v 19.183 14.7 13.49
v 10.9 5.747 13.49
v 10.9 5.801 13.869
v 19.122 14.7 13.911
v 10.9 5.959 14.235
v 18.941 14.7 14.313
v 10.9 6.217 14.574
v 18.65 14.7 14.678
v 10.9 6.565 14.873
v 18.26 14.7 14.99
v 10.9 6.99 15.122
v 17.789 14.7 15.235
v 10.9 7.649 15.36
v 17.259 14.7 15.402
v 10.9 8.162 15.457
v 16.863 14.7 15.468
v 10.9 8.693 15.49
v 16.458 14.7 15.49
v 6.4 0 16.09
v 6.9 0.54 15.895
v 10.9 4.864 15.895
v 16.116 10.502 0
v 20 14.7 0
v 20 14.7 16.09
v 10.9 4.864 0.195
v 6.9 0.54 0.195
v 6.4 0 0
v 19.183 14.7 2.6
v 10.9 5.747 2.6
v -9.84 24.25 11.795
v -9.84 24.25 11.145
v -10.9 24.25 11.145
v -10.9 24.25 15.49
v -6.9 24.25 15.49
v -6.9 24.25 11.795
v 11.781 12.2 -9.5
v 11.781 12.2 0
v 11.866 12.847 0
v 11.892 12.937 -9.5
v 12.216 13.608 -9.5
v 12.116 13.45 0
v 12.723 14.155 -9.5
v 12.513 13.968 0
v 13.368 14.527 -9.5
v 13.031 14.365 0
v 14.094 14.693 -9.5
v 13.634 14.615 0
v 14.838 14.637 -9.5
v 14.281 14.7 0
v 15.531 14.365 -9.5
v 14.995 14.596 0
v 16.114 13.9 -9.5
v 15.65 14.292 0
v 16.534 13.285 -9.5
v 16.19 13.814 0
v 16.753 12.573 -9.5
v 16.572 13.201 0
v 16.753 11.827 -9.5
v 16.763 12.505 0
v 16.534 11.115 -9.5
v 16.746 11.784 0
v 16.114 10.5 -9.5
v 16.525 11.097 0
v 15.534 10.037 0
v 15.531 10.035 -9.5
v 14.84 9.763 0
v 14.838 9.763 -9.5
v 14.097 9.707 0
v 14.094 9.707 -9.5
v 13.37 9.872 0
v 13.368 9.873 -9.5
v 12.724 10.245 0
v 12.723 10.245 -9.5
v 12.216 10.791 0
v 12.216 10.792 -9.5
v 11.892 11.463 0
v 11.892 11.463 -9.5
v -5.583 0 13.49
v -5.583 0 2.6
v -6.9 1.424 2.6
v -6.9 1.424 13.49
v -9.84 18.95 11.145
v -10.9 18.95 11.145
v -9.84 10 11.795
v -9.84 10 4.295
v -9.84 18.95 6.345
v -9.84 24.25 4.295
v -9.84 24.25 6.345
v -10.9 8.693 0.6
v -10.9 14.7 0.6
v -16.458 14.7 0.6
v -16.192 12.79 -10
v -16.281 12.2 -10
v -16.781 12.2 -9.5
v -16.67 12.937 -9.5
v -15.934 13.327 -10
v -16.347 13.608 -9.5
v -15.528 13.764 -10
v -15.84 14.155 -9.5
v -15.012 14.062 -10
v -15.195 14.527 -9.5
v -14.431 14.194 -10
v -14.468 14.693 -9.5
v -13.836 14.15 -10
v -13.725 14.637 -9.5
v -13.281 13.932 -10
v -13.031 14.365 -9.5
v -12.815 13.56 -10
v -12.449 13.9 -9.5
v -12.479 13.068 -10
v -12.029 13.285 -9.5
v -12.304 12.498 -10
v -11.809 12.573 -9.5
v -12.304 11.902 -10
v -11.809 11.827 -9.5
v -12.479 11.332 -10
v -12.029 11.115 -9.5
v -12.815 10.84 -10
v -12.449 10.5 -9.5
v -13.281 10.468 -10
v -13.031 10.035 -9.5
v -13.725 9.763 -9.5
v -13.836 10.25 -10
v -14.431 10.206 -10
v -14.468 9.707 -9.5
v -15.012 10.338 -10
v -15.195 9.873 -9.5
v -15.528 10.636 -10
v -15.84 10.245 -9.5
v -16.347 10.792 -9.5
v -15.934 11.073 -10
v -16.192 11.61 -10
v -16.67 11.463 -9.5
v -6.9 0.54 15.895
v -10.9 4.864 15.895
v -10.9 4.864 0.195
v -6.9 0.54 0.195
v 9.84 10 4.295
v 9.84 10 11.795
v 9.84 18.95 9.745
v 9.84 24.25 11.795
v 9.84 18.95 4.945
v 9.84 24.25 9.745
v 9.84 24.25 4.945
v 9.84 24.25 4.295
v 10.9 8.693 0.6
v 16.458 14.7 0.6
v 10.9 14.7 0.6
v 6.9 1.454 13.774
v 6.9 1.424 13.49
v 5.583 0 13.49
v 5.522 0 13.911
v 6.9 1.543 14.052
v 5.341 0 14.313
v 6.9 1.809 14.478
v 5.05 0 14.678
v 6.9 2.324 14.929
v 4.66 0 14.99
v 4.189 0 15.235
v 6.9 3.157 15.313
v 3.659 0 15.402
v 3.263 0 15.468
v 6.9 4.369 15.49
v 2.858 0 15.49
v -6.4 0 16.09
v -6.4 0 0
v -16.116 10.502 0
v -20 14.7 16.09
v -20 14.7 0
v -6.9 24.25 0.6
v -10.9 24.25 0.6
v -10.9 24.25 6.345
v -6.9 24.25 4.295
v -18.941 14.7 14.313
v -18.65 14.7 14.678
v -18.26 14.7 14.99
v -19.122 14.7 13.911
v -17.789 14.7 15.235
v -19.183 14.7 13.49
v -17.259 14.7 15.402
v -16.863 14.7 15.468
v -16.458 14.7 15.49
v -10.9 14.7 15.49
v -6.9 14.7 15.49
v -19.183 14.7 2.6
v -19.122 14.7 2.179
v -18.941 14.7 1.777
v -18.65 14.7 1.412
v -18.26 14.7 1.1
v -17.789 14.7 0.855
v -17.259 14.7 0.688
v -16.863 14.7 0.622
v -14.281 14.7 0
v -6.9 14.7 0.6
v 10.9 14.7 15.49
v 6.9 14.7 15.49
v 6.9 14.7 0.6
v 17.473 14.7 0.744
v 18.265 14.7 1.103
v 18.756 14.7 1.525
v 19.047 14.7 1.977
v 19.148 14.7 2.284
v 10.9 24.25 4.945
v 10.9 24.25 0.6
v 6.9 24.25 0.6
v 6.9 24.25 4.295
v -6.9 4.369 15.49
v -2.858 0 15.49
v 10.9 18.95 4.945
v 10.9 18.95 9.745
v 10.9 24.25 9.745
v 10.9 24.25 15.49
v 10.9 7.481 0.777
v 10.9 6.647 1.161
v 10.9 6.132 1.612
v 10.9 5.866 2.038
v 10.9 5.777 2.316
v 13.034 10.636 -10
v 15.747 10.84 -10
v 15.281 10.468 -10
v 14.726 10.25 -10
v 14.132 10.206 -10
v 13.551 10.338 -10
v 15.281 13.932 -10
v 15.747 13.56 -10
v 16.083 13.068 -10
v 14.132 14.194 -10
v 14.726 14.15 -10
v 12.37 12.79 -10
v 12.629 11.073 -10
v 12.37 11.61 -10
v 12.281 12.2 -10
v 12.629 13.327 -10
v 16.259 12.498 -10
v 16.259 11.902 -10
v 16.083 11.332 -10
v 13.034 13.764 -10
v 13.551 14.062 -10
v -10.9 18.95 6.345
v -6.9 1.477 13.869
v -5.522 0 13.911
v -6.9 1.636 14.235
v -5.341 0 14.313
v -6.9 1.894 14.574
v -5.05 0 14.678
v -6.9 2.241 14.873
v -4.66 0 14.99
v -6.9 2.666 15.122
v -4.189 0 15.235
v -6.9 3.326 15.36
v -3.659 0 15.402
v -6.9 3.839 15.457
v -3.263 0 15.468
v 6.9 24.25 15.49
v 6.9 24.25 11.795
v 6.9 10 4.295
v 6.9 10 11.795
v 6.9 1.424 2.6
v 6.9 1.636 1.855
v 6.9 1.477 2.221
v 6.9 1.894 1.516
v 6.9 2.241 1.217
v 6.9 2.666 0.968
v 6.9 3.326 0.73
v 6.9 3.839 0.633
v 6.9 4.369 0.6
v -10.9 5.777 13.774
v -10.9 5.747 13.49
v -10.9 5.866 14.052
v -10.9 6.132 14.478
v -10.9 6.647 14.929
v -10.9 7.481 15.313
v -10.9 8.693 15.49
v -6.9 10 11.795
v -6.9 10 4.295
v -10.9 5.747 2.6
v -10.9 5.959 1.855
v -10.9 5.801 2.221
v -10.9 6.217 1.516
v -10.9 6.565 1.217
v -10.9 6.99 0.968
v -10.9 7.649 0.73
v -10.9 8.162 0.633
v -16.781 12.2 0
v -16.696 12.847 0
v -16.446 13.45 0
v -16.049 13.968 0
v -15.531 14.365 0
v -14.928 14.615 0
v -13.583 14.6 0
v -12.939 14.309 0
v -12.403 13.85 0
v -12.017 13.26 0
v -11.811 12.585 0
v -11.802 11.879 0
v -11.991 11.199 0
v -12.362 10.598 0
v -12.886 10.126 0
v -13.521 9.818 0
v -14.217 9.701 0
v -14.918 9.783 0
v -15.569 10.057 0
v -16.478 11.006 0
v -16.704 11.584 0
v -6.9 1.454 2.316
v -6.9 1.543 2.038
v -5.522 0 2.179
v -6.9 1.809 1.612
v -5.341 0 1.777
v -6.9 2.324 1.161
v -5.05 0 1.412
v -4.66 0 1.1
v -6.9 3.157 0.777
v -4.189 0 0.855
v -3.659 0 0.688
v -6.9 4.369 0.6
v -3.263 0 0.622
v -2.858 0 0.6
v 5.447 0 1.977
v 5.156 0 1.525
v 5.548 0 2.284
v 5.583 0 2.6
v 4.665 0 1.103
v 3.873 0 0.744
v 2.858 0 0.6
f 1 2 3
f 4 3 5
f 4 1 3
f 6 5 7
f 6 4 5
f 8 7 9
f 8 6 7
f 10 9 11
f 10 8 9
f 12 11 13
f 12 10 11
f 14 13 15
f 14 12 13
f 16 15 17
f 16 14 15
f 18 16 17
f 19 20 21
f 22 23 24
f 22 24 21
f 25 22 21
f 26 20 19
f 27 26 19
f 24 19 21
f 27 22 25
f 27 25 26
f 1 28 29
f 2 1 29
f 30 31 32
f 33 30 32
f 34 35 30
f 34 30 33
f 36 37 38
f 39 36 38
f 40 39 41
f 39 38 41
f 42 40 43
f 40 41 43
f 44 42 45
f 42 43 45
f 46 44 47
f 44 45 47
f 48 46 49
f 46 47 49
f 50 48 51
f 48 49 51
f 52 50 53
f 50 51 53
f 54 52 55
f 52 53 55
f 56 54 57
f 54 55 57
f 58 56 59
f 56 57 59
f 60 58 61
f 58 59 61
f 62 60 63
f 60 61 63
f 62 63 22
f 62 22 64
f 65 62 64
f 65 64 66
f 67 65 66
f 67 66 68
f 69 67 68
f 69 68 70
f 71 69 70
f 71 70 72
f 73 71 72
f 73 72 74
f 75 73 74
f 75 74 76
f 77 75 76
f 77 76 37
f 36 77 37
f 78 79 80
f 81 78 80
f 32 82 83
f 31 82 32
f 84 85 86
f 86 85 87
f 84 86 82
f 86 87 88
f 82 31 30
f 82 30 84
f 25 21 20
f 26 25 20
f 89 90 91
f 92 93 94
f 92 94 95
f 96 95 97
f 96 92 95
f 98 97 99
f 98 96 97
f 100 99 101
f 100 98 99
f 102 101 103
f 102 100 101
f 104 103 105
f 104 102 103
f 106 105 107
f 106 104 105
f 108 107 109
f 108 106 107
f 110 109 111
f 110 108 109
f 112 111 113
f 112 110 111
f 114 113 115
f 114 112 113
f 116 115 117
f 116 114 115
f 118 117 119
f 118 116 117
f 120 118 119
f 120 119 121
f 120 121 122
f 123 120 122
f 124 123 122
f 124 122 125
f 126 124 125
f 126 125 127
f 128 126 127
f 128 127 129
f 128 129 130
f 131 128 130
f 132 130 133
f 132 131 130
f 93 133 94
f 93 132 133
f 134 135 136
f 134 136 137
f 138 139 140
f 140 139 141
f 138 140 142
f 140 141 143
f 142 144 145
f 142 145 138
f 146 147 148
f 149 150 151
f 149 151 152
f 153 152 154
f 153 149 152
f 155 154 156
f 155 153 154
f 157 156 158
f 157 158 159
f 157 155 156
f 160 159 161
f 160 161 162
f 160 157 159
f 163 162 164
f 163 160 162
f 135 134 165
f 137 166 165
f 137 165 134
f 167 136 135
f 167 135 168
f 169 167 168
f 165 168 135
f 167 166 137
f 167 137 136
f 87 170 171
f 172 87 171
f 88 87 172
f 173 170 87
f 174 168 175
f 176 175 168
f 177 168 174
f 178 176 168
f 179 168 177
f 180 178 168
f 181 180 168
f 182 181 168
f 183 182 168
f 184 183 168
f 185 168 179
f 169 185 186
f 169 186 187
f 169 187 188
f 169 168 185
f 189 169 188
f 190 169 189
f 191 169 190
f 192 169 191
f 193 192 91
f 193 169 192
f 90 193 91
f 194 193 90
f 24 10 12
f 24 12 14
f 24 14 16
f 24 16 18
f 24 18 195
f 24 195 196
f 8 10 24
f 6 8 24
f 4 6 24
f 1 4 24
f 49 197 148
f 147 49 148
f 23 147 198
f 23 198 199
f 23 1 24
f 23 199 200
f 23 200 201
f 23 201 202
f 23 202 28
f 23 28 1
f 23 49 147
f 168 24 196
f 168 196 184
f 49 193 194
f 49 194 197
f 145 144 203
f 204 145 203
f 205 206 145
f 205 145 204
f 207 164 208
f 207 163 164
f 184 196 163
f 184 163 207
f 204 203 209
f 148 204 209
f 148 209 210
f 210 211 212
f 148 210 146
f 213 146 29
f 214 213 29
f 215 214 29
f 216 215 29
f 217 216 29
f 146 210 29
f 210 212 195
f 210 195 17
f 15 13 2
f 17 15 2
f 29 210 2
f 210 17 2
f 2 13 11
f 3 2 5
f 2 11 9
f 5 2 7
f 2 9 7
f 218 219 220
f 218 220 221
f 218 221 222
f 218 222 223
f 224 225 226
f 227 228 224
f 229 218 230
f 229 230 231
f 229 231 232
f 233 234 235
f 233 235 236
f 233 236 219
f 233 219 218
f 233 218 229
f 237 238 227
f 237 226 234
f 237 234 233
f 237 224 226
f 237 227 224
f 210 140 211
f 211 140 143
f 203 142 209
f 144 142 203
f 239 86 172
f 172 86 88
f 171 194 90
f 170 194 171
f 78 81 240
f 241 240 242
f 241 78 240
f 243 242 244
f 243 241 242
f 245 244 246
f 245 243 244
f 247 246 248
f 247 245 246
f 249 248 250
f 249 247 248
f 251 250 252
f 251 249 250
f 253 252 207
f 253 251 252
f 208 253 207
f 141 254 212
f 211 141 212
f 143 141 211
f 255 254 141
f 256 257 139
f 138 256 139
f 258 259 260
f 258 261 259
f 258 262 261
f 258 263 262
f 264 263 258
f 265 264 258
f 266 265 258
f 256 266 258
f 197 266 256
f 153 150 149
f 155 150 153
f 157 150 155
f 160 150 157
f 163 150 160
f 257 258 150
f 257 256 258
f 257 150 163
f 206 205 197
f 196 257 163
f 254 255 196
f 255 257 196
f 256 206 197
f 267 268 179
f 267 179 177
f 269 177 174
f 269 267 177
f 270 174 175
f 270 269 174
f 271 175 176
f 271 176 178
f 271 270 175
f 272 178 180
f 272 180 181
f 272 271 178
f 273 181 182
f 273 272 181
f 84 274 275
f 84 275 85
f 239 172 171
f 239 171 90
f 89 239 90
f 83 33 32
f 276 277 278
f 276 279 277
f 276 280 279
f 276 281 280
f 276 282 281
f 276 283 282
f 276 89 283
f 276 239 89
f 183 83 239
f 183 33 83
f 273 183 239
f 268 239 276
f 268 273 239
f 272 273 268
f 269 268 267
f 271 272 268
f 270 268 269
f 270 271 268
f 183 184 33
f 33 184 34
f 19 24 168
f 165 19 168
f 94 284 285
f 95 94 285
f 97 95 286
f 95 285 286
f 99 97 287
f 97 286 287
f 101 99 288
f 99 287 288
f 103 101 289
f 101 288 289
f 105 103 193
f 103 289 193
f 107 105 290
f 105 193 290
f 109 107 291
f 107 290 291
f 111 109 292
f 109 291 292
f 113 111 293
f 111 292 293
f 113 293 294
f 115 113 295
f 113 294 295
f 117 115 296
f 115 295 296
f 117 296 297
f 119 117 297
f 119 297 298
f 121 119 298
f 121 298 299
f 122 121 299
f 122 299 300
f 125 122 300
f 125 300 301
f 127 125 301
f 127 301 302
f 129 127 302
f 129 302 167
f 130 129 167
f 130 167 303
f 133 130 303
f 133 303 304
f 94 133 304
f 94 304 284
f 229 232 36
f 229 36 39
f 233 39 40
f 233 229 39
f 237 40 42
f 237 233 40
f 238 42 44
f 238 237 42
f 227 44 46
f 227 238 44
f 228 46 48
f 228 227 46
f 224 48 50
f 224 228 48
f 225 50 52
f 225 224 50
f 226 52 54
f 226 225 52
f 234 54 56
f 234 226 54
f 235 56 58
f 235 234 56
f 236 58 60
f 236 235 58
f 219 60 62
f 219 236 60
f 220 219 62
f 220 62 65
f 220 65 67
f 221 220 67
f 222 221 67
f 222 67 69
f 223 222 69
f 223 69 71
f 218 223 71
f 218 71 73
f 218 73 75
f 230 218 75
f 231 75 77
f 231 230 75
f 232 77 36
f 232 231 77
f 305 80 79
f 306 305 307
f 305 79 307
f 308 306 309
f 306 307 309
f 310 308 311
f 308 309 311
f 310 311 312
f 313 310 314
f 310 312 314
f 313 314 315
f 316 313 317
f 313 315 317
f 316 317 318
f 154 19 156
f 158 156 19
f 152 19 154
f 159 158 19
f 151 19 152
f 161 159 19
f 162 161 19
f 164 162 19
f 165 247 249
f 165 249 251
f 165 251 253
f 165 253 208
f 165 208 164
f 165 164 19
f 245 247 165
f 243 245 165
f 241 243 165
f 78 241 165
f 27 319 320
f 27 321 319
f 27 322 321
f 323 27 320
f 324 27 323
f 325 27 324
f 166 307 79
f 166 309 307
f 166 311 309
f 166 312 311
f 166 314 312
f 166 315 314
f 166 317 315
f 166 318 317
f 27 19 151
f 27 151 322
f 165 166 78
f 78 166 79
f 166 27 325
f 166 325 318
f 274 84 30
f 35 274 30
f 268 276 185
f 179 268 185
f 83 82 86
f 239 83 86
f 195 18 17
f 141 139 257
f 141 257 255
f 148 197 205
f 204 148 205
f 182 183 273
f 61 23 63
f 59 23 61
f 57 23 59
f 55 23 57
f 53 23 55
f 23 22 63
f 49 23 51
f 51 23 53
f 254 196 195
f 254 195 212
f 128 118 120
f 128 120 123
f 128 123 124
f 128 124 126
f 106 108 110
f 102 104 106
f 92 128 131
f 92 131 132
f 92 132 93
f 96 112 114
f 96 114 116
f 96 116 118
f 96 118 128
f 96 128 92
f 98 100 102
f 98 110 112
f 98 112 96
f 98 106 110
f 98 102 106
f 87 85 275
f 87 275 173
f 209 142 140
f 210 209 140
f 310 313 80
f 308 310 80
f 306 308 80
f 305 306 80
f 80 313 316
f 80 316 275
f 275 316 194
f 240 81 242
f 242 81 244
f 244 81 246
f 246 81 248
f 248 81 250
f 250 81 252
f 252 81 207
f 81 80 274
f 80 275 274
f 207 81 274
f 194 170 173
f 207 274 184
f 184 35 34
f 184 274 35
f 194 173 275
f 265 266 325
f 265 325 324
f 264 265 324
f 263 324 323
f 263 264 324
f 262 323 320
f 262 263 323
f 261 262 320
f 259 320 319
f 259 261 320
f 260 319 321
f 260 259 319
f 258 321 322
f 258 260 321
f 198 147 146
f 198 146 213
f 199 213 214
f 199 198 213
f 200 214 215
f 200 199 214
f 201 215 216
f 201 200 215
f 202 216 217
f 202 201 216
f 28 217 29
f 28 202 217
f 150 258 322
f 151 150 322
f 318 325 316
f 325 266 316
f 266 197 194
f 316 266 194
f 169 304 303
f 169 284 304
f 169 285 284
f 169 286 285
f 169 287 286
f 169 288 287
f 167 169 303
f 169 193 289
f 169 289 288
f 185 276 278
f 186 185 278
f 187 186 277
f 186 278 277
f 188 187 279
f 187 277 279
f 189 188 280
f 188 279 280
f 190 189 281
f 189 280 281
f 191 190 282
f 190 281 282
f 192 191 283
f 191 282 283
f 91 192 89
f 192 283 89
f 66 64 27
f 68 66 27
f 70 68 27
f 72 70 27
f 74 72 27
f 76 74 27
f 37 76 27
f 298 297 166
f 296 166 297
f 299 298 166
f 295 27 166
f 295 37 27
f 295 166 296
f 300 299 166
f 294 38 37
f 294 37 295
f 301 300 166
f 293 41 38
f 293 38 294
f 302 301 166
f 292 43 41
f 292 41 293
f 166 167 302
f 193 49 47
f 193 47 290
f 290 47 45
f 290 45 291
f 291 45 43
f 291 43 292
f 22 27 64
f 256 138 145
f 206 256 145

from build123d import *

# Parameters (mm, degrees)
AUFSATZ_LINEAR_AUSTRAGEN1_DEPTH  = 16.09
WANDUNG2_T                       = -0.6
VERRUNDUNG1_R                    = 2
VERRUNDUNG2_R                    = 2
SKIZZE7_R                        = 2.5
AUFSATZ_LINEAR_AUSTRAGEN4_DEPTH  = 10
FASE3_SIZE                       = 0.5
AUFSATZ_LINEAR_AUSTRAGEN8_DEPTH  = 7.85
SKIZZE14_W                       = 3.695
SKIZZE14_H                       = 14.25
AUFSATZ_LINEAR_AUSTRAGEN9_DEPTH  = 2.94
SKIZZE15_W                       = 14.89
SKIZZE15_H                       = 14.52
AUFSATZ_LINEAR_AUSTRAGEN10_DEPTH = 1.06
SCHNITT_LINEAR_AUSTRAGEN1_REACH  = 12.16
SKIZZE16_W                       = 4.8
SKIZZE16_H                       = 5.3
SKIZZE17_W                       = 14.89
SKIZZE17_H                       = 14.52
AUFSATZ_LINEAR_AUSTRAGEN11_DEPTH = 1.06
SCHNITT_LINEAR_AUSTRAGEN2_REACH  = 12.16
SKIZZE18_W                       = 4.8
SKIZZE18_H                       = 5.3


with BuildPart() as part:
    # Skizze4 → Aufsatz-Linear austragen1 (new body)
    with BuildSketch(Plane.XY):
        Polygon((-6.4, 0), (-20, 14.7), (20, 14.7), (6.4, 0), align=None)
    extrude(amount=AUFSATZ_LINEAR_AUSTRAGEN1_DEPTH)

    # Wandung2
    wandung2_openings = [part.faces().sort_by_distance(p)[0] for p in [
        (0, 14.7, 8.045),
        (0, 0, 8.045),
    ]]
    offset(amount=WANDUNG2_T, openings=wandung2_openings, kind=Kind.INTERSECTION)

    # Verrundung1
    verrundung1_edges = [part.edges().sort_by_distance(p)[0] for p in [
        (12.382602743, 7.35, 15.49),
        (-12.382602743, 7.35, 15.49),
    ]]
    fillet(verrundung1_edges, radius=VERRUNDUNG1_R)

    # Verrundung2
    verrundung2_edges = [part.edges().sort_by_distance(p)[0] for p in [
        (12.382602743, 7.35, 0.6),
        (-12.382602743, 7.35, 0.6),
    ]]
    fillet(verrundung2_edges, radius=VERRUNDUNG2_R)

    # Skizze7 → Aufsatz-Linear austragen4 (add)
    with BuildSketch(Plane(origin=(0, 0, 0), x_dir=(-1, 0, 0), z_dir=(0, 0, -1))):
        with Locations((-14.281252926, 12.2)):
            Circle(SKIZZE7_R)
        with Locations((14.281252926, 12.2)):
            Circle(SKIZZE7_R)
    extrude(amount=AUFSATZ_LINEAR_AUSTRAGEN4_DEPTH)

    # Fase3
    fase3_edges = [part.edges().sort_by_distance(p)[0] for p in [
        (16.781252926, 12.2, -10),
        (-11.781252926, 12.2, -10),
    ]]
    chamfer(fase3_edges, length=FASE3_SIZE)

    # Skizze12 → Aufsatz-Linear austragen8 (add, symmetric)
    with BuildSketch(Plane.XY.offset(8.045)):
        Polygon((6.9, 0.540441176), (6.9, 10), (10.9, 10), (10.9, 4.863970588), align=None)
    aufsatz_linear_austragen8 = extrude(amount=AUFSATZ_LINEAR_AUSTRAGEN8_DEPTH, both=True)

    # Spiegeln6: Aufsatz-Linear austragen8 across plane
    add(aufsatz_linear_austragen8.mirror(Plane(origin=(0, 0, 0), x_dir=(0, 0, 1), z_dir=(1, 0, 0))))

    # Skizze14 → Aufsatz-Linear austragen9 (add)
    with BuildSketch(Plane.ZY.offset(-9.84)):
        with Locations((2.4475, 17.125)):
            Rectangle(SKIZZE14_W, SKIZZE14_H)
        with Locations((13.6425, 17.125)):
            Rectangle(SKIZZE14_W, SKIZZE14_H)
    aufsatz_linear_austragen9 = extrude(amount=AUFSATZ_LINEAR_AUSTRAGEN9_DEPTH)

    # Skizze15 → Aufsatz-Linear austragen10 (add)
    with BuildSketch(Plane(origin=(9.84, 0, 0), x_dir=(0, 0, -1), z_dir=(1, 0, 0))):
        with Locations((-8.045, 16.99)):
            Rectangle(SKIZZE15_W, SKIZZE15_H)
    extrude(amount=AUFSATZ_LINEAR_AUSTRAGEN10_DEPTH)

    # Skizze16 → Schnitt-Linear austragen1 (cut, up to next)
    with BuildSketch(Plane.ZY.offset(-9.84), mode=Mode.PRIVATE) as schnitt_linear_austragen1_sk1:
        with Locations((7.345, 21.6)):
            Rectangle(SKIZZE16_W, SKIZZE16_H)
    schnitt_linear_austragen1_tool1 = extrude(schnitt_linear_austragen1_sk1.sketch, amount=-SCHNITT_LINEAR_AUSTRAGEN1_REACH, mode=Mode.PRIVATE) & part.part
    add(schnitt_linear_austragen1_tool1.solids().sort_by_distance((9.84, 21.6, 7.345))[0], mode=Mode.SUBTRACT)

    # Spiegeln9: Aufsatz-Linear austragen9 across plane
    add(aufsatz_linear_austragen9.mirror(Plane(origin=(0, 0, 0), x_dir=(0, 0, 1), z_dir=(1, 0, 0))))

    # Skizze17 → Aufsatz-Linear austragen11 (add)
    with BuildSketch(Plane.ZY.offset(9.84)):
        with Locations((8.045, 16.99)):
            Rectangle(SKIZZE17_W, SKIZZE17_H)
    extrude(amount=AUFSATZ_LINEAR_AUSTRAGEN11_DEPTH)

    # Skizze18 → Schnitt-Linear austragen2 (cut, up to next)
    with BuildSketch(Plane(origin=(-9.84, 0, 0), x_dir=(0, 0, -1), z_dir=(1, 0, 0)), mode=Mode.PRIVATE) as schnitt_linear_austragen2_sk1:
        with Locations((-8.745, 21.6)):
            Rectangle(SKIZZE18_W, SKIZZE18_H)
    schnitt_linear_austragen2_tool1 = extrude(schnitt_linear_austragen2_sk1.sketch, amount=-SCHNITT_LINEAR_AUSTRAGEN2_REACH, mode=Mode.PRIVATE) & part.part
    add(schnitt_linear_austragen2_tool1.solids().sort_by_distance((-9.84, 21.6, 8.745))[0], mode=Mode.SUBTRACT)


solid = part.part
